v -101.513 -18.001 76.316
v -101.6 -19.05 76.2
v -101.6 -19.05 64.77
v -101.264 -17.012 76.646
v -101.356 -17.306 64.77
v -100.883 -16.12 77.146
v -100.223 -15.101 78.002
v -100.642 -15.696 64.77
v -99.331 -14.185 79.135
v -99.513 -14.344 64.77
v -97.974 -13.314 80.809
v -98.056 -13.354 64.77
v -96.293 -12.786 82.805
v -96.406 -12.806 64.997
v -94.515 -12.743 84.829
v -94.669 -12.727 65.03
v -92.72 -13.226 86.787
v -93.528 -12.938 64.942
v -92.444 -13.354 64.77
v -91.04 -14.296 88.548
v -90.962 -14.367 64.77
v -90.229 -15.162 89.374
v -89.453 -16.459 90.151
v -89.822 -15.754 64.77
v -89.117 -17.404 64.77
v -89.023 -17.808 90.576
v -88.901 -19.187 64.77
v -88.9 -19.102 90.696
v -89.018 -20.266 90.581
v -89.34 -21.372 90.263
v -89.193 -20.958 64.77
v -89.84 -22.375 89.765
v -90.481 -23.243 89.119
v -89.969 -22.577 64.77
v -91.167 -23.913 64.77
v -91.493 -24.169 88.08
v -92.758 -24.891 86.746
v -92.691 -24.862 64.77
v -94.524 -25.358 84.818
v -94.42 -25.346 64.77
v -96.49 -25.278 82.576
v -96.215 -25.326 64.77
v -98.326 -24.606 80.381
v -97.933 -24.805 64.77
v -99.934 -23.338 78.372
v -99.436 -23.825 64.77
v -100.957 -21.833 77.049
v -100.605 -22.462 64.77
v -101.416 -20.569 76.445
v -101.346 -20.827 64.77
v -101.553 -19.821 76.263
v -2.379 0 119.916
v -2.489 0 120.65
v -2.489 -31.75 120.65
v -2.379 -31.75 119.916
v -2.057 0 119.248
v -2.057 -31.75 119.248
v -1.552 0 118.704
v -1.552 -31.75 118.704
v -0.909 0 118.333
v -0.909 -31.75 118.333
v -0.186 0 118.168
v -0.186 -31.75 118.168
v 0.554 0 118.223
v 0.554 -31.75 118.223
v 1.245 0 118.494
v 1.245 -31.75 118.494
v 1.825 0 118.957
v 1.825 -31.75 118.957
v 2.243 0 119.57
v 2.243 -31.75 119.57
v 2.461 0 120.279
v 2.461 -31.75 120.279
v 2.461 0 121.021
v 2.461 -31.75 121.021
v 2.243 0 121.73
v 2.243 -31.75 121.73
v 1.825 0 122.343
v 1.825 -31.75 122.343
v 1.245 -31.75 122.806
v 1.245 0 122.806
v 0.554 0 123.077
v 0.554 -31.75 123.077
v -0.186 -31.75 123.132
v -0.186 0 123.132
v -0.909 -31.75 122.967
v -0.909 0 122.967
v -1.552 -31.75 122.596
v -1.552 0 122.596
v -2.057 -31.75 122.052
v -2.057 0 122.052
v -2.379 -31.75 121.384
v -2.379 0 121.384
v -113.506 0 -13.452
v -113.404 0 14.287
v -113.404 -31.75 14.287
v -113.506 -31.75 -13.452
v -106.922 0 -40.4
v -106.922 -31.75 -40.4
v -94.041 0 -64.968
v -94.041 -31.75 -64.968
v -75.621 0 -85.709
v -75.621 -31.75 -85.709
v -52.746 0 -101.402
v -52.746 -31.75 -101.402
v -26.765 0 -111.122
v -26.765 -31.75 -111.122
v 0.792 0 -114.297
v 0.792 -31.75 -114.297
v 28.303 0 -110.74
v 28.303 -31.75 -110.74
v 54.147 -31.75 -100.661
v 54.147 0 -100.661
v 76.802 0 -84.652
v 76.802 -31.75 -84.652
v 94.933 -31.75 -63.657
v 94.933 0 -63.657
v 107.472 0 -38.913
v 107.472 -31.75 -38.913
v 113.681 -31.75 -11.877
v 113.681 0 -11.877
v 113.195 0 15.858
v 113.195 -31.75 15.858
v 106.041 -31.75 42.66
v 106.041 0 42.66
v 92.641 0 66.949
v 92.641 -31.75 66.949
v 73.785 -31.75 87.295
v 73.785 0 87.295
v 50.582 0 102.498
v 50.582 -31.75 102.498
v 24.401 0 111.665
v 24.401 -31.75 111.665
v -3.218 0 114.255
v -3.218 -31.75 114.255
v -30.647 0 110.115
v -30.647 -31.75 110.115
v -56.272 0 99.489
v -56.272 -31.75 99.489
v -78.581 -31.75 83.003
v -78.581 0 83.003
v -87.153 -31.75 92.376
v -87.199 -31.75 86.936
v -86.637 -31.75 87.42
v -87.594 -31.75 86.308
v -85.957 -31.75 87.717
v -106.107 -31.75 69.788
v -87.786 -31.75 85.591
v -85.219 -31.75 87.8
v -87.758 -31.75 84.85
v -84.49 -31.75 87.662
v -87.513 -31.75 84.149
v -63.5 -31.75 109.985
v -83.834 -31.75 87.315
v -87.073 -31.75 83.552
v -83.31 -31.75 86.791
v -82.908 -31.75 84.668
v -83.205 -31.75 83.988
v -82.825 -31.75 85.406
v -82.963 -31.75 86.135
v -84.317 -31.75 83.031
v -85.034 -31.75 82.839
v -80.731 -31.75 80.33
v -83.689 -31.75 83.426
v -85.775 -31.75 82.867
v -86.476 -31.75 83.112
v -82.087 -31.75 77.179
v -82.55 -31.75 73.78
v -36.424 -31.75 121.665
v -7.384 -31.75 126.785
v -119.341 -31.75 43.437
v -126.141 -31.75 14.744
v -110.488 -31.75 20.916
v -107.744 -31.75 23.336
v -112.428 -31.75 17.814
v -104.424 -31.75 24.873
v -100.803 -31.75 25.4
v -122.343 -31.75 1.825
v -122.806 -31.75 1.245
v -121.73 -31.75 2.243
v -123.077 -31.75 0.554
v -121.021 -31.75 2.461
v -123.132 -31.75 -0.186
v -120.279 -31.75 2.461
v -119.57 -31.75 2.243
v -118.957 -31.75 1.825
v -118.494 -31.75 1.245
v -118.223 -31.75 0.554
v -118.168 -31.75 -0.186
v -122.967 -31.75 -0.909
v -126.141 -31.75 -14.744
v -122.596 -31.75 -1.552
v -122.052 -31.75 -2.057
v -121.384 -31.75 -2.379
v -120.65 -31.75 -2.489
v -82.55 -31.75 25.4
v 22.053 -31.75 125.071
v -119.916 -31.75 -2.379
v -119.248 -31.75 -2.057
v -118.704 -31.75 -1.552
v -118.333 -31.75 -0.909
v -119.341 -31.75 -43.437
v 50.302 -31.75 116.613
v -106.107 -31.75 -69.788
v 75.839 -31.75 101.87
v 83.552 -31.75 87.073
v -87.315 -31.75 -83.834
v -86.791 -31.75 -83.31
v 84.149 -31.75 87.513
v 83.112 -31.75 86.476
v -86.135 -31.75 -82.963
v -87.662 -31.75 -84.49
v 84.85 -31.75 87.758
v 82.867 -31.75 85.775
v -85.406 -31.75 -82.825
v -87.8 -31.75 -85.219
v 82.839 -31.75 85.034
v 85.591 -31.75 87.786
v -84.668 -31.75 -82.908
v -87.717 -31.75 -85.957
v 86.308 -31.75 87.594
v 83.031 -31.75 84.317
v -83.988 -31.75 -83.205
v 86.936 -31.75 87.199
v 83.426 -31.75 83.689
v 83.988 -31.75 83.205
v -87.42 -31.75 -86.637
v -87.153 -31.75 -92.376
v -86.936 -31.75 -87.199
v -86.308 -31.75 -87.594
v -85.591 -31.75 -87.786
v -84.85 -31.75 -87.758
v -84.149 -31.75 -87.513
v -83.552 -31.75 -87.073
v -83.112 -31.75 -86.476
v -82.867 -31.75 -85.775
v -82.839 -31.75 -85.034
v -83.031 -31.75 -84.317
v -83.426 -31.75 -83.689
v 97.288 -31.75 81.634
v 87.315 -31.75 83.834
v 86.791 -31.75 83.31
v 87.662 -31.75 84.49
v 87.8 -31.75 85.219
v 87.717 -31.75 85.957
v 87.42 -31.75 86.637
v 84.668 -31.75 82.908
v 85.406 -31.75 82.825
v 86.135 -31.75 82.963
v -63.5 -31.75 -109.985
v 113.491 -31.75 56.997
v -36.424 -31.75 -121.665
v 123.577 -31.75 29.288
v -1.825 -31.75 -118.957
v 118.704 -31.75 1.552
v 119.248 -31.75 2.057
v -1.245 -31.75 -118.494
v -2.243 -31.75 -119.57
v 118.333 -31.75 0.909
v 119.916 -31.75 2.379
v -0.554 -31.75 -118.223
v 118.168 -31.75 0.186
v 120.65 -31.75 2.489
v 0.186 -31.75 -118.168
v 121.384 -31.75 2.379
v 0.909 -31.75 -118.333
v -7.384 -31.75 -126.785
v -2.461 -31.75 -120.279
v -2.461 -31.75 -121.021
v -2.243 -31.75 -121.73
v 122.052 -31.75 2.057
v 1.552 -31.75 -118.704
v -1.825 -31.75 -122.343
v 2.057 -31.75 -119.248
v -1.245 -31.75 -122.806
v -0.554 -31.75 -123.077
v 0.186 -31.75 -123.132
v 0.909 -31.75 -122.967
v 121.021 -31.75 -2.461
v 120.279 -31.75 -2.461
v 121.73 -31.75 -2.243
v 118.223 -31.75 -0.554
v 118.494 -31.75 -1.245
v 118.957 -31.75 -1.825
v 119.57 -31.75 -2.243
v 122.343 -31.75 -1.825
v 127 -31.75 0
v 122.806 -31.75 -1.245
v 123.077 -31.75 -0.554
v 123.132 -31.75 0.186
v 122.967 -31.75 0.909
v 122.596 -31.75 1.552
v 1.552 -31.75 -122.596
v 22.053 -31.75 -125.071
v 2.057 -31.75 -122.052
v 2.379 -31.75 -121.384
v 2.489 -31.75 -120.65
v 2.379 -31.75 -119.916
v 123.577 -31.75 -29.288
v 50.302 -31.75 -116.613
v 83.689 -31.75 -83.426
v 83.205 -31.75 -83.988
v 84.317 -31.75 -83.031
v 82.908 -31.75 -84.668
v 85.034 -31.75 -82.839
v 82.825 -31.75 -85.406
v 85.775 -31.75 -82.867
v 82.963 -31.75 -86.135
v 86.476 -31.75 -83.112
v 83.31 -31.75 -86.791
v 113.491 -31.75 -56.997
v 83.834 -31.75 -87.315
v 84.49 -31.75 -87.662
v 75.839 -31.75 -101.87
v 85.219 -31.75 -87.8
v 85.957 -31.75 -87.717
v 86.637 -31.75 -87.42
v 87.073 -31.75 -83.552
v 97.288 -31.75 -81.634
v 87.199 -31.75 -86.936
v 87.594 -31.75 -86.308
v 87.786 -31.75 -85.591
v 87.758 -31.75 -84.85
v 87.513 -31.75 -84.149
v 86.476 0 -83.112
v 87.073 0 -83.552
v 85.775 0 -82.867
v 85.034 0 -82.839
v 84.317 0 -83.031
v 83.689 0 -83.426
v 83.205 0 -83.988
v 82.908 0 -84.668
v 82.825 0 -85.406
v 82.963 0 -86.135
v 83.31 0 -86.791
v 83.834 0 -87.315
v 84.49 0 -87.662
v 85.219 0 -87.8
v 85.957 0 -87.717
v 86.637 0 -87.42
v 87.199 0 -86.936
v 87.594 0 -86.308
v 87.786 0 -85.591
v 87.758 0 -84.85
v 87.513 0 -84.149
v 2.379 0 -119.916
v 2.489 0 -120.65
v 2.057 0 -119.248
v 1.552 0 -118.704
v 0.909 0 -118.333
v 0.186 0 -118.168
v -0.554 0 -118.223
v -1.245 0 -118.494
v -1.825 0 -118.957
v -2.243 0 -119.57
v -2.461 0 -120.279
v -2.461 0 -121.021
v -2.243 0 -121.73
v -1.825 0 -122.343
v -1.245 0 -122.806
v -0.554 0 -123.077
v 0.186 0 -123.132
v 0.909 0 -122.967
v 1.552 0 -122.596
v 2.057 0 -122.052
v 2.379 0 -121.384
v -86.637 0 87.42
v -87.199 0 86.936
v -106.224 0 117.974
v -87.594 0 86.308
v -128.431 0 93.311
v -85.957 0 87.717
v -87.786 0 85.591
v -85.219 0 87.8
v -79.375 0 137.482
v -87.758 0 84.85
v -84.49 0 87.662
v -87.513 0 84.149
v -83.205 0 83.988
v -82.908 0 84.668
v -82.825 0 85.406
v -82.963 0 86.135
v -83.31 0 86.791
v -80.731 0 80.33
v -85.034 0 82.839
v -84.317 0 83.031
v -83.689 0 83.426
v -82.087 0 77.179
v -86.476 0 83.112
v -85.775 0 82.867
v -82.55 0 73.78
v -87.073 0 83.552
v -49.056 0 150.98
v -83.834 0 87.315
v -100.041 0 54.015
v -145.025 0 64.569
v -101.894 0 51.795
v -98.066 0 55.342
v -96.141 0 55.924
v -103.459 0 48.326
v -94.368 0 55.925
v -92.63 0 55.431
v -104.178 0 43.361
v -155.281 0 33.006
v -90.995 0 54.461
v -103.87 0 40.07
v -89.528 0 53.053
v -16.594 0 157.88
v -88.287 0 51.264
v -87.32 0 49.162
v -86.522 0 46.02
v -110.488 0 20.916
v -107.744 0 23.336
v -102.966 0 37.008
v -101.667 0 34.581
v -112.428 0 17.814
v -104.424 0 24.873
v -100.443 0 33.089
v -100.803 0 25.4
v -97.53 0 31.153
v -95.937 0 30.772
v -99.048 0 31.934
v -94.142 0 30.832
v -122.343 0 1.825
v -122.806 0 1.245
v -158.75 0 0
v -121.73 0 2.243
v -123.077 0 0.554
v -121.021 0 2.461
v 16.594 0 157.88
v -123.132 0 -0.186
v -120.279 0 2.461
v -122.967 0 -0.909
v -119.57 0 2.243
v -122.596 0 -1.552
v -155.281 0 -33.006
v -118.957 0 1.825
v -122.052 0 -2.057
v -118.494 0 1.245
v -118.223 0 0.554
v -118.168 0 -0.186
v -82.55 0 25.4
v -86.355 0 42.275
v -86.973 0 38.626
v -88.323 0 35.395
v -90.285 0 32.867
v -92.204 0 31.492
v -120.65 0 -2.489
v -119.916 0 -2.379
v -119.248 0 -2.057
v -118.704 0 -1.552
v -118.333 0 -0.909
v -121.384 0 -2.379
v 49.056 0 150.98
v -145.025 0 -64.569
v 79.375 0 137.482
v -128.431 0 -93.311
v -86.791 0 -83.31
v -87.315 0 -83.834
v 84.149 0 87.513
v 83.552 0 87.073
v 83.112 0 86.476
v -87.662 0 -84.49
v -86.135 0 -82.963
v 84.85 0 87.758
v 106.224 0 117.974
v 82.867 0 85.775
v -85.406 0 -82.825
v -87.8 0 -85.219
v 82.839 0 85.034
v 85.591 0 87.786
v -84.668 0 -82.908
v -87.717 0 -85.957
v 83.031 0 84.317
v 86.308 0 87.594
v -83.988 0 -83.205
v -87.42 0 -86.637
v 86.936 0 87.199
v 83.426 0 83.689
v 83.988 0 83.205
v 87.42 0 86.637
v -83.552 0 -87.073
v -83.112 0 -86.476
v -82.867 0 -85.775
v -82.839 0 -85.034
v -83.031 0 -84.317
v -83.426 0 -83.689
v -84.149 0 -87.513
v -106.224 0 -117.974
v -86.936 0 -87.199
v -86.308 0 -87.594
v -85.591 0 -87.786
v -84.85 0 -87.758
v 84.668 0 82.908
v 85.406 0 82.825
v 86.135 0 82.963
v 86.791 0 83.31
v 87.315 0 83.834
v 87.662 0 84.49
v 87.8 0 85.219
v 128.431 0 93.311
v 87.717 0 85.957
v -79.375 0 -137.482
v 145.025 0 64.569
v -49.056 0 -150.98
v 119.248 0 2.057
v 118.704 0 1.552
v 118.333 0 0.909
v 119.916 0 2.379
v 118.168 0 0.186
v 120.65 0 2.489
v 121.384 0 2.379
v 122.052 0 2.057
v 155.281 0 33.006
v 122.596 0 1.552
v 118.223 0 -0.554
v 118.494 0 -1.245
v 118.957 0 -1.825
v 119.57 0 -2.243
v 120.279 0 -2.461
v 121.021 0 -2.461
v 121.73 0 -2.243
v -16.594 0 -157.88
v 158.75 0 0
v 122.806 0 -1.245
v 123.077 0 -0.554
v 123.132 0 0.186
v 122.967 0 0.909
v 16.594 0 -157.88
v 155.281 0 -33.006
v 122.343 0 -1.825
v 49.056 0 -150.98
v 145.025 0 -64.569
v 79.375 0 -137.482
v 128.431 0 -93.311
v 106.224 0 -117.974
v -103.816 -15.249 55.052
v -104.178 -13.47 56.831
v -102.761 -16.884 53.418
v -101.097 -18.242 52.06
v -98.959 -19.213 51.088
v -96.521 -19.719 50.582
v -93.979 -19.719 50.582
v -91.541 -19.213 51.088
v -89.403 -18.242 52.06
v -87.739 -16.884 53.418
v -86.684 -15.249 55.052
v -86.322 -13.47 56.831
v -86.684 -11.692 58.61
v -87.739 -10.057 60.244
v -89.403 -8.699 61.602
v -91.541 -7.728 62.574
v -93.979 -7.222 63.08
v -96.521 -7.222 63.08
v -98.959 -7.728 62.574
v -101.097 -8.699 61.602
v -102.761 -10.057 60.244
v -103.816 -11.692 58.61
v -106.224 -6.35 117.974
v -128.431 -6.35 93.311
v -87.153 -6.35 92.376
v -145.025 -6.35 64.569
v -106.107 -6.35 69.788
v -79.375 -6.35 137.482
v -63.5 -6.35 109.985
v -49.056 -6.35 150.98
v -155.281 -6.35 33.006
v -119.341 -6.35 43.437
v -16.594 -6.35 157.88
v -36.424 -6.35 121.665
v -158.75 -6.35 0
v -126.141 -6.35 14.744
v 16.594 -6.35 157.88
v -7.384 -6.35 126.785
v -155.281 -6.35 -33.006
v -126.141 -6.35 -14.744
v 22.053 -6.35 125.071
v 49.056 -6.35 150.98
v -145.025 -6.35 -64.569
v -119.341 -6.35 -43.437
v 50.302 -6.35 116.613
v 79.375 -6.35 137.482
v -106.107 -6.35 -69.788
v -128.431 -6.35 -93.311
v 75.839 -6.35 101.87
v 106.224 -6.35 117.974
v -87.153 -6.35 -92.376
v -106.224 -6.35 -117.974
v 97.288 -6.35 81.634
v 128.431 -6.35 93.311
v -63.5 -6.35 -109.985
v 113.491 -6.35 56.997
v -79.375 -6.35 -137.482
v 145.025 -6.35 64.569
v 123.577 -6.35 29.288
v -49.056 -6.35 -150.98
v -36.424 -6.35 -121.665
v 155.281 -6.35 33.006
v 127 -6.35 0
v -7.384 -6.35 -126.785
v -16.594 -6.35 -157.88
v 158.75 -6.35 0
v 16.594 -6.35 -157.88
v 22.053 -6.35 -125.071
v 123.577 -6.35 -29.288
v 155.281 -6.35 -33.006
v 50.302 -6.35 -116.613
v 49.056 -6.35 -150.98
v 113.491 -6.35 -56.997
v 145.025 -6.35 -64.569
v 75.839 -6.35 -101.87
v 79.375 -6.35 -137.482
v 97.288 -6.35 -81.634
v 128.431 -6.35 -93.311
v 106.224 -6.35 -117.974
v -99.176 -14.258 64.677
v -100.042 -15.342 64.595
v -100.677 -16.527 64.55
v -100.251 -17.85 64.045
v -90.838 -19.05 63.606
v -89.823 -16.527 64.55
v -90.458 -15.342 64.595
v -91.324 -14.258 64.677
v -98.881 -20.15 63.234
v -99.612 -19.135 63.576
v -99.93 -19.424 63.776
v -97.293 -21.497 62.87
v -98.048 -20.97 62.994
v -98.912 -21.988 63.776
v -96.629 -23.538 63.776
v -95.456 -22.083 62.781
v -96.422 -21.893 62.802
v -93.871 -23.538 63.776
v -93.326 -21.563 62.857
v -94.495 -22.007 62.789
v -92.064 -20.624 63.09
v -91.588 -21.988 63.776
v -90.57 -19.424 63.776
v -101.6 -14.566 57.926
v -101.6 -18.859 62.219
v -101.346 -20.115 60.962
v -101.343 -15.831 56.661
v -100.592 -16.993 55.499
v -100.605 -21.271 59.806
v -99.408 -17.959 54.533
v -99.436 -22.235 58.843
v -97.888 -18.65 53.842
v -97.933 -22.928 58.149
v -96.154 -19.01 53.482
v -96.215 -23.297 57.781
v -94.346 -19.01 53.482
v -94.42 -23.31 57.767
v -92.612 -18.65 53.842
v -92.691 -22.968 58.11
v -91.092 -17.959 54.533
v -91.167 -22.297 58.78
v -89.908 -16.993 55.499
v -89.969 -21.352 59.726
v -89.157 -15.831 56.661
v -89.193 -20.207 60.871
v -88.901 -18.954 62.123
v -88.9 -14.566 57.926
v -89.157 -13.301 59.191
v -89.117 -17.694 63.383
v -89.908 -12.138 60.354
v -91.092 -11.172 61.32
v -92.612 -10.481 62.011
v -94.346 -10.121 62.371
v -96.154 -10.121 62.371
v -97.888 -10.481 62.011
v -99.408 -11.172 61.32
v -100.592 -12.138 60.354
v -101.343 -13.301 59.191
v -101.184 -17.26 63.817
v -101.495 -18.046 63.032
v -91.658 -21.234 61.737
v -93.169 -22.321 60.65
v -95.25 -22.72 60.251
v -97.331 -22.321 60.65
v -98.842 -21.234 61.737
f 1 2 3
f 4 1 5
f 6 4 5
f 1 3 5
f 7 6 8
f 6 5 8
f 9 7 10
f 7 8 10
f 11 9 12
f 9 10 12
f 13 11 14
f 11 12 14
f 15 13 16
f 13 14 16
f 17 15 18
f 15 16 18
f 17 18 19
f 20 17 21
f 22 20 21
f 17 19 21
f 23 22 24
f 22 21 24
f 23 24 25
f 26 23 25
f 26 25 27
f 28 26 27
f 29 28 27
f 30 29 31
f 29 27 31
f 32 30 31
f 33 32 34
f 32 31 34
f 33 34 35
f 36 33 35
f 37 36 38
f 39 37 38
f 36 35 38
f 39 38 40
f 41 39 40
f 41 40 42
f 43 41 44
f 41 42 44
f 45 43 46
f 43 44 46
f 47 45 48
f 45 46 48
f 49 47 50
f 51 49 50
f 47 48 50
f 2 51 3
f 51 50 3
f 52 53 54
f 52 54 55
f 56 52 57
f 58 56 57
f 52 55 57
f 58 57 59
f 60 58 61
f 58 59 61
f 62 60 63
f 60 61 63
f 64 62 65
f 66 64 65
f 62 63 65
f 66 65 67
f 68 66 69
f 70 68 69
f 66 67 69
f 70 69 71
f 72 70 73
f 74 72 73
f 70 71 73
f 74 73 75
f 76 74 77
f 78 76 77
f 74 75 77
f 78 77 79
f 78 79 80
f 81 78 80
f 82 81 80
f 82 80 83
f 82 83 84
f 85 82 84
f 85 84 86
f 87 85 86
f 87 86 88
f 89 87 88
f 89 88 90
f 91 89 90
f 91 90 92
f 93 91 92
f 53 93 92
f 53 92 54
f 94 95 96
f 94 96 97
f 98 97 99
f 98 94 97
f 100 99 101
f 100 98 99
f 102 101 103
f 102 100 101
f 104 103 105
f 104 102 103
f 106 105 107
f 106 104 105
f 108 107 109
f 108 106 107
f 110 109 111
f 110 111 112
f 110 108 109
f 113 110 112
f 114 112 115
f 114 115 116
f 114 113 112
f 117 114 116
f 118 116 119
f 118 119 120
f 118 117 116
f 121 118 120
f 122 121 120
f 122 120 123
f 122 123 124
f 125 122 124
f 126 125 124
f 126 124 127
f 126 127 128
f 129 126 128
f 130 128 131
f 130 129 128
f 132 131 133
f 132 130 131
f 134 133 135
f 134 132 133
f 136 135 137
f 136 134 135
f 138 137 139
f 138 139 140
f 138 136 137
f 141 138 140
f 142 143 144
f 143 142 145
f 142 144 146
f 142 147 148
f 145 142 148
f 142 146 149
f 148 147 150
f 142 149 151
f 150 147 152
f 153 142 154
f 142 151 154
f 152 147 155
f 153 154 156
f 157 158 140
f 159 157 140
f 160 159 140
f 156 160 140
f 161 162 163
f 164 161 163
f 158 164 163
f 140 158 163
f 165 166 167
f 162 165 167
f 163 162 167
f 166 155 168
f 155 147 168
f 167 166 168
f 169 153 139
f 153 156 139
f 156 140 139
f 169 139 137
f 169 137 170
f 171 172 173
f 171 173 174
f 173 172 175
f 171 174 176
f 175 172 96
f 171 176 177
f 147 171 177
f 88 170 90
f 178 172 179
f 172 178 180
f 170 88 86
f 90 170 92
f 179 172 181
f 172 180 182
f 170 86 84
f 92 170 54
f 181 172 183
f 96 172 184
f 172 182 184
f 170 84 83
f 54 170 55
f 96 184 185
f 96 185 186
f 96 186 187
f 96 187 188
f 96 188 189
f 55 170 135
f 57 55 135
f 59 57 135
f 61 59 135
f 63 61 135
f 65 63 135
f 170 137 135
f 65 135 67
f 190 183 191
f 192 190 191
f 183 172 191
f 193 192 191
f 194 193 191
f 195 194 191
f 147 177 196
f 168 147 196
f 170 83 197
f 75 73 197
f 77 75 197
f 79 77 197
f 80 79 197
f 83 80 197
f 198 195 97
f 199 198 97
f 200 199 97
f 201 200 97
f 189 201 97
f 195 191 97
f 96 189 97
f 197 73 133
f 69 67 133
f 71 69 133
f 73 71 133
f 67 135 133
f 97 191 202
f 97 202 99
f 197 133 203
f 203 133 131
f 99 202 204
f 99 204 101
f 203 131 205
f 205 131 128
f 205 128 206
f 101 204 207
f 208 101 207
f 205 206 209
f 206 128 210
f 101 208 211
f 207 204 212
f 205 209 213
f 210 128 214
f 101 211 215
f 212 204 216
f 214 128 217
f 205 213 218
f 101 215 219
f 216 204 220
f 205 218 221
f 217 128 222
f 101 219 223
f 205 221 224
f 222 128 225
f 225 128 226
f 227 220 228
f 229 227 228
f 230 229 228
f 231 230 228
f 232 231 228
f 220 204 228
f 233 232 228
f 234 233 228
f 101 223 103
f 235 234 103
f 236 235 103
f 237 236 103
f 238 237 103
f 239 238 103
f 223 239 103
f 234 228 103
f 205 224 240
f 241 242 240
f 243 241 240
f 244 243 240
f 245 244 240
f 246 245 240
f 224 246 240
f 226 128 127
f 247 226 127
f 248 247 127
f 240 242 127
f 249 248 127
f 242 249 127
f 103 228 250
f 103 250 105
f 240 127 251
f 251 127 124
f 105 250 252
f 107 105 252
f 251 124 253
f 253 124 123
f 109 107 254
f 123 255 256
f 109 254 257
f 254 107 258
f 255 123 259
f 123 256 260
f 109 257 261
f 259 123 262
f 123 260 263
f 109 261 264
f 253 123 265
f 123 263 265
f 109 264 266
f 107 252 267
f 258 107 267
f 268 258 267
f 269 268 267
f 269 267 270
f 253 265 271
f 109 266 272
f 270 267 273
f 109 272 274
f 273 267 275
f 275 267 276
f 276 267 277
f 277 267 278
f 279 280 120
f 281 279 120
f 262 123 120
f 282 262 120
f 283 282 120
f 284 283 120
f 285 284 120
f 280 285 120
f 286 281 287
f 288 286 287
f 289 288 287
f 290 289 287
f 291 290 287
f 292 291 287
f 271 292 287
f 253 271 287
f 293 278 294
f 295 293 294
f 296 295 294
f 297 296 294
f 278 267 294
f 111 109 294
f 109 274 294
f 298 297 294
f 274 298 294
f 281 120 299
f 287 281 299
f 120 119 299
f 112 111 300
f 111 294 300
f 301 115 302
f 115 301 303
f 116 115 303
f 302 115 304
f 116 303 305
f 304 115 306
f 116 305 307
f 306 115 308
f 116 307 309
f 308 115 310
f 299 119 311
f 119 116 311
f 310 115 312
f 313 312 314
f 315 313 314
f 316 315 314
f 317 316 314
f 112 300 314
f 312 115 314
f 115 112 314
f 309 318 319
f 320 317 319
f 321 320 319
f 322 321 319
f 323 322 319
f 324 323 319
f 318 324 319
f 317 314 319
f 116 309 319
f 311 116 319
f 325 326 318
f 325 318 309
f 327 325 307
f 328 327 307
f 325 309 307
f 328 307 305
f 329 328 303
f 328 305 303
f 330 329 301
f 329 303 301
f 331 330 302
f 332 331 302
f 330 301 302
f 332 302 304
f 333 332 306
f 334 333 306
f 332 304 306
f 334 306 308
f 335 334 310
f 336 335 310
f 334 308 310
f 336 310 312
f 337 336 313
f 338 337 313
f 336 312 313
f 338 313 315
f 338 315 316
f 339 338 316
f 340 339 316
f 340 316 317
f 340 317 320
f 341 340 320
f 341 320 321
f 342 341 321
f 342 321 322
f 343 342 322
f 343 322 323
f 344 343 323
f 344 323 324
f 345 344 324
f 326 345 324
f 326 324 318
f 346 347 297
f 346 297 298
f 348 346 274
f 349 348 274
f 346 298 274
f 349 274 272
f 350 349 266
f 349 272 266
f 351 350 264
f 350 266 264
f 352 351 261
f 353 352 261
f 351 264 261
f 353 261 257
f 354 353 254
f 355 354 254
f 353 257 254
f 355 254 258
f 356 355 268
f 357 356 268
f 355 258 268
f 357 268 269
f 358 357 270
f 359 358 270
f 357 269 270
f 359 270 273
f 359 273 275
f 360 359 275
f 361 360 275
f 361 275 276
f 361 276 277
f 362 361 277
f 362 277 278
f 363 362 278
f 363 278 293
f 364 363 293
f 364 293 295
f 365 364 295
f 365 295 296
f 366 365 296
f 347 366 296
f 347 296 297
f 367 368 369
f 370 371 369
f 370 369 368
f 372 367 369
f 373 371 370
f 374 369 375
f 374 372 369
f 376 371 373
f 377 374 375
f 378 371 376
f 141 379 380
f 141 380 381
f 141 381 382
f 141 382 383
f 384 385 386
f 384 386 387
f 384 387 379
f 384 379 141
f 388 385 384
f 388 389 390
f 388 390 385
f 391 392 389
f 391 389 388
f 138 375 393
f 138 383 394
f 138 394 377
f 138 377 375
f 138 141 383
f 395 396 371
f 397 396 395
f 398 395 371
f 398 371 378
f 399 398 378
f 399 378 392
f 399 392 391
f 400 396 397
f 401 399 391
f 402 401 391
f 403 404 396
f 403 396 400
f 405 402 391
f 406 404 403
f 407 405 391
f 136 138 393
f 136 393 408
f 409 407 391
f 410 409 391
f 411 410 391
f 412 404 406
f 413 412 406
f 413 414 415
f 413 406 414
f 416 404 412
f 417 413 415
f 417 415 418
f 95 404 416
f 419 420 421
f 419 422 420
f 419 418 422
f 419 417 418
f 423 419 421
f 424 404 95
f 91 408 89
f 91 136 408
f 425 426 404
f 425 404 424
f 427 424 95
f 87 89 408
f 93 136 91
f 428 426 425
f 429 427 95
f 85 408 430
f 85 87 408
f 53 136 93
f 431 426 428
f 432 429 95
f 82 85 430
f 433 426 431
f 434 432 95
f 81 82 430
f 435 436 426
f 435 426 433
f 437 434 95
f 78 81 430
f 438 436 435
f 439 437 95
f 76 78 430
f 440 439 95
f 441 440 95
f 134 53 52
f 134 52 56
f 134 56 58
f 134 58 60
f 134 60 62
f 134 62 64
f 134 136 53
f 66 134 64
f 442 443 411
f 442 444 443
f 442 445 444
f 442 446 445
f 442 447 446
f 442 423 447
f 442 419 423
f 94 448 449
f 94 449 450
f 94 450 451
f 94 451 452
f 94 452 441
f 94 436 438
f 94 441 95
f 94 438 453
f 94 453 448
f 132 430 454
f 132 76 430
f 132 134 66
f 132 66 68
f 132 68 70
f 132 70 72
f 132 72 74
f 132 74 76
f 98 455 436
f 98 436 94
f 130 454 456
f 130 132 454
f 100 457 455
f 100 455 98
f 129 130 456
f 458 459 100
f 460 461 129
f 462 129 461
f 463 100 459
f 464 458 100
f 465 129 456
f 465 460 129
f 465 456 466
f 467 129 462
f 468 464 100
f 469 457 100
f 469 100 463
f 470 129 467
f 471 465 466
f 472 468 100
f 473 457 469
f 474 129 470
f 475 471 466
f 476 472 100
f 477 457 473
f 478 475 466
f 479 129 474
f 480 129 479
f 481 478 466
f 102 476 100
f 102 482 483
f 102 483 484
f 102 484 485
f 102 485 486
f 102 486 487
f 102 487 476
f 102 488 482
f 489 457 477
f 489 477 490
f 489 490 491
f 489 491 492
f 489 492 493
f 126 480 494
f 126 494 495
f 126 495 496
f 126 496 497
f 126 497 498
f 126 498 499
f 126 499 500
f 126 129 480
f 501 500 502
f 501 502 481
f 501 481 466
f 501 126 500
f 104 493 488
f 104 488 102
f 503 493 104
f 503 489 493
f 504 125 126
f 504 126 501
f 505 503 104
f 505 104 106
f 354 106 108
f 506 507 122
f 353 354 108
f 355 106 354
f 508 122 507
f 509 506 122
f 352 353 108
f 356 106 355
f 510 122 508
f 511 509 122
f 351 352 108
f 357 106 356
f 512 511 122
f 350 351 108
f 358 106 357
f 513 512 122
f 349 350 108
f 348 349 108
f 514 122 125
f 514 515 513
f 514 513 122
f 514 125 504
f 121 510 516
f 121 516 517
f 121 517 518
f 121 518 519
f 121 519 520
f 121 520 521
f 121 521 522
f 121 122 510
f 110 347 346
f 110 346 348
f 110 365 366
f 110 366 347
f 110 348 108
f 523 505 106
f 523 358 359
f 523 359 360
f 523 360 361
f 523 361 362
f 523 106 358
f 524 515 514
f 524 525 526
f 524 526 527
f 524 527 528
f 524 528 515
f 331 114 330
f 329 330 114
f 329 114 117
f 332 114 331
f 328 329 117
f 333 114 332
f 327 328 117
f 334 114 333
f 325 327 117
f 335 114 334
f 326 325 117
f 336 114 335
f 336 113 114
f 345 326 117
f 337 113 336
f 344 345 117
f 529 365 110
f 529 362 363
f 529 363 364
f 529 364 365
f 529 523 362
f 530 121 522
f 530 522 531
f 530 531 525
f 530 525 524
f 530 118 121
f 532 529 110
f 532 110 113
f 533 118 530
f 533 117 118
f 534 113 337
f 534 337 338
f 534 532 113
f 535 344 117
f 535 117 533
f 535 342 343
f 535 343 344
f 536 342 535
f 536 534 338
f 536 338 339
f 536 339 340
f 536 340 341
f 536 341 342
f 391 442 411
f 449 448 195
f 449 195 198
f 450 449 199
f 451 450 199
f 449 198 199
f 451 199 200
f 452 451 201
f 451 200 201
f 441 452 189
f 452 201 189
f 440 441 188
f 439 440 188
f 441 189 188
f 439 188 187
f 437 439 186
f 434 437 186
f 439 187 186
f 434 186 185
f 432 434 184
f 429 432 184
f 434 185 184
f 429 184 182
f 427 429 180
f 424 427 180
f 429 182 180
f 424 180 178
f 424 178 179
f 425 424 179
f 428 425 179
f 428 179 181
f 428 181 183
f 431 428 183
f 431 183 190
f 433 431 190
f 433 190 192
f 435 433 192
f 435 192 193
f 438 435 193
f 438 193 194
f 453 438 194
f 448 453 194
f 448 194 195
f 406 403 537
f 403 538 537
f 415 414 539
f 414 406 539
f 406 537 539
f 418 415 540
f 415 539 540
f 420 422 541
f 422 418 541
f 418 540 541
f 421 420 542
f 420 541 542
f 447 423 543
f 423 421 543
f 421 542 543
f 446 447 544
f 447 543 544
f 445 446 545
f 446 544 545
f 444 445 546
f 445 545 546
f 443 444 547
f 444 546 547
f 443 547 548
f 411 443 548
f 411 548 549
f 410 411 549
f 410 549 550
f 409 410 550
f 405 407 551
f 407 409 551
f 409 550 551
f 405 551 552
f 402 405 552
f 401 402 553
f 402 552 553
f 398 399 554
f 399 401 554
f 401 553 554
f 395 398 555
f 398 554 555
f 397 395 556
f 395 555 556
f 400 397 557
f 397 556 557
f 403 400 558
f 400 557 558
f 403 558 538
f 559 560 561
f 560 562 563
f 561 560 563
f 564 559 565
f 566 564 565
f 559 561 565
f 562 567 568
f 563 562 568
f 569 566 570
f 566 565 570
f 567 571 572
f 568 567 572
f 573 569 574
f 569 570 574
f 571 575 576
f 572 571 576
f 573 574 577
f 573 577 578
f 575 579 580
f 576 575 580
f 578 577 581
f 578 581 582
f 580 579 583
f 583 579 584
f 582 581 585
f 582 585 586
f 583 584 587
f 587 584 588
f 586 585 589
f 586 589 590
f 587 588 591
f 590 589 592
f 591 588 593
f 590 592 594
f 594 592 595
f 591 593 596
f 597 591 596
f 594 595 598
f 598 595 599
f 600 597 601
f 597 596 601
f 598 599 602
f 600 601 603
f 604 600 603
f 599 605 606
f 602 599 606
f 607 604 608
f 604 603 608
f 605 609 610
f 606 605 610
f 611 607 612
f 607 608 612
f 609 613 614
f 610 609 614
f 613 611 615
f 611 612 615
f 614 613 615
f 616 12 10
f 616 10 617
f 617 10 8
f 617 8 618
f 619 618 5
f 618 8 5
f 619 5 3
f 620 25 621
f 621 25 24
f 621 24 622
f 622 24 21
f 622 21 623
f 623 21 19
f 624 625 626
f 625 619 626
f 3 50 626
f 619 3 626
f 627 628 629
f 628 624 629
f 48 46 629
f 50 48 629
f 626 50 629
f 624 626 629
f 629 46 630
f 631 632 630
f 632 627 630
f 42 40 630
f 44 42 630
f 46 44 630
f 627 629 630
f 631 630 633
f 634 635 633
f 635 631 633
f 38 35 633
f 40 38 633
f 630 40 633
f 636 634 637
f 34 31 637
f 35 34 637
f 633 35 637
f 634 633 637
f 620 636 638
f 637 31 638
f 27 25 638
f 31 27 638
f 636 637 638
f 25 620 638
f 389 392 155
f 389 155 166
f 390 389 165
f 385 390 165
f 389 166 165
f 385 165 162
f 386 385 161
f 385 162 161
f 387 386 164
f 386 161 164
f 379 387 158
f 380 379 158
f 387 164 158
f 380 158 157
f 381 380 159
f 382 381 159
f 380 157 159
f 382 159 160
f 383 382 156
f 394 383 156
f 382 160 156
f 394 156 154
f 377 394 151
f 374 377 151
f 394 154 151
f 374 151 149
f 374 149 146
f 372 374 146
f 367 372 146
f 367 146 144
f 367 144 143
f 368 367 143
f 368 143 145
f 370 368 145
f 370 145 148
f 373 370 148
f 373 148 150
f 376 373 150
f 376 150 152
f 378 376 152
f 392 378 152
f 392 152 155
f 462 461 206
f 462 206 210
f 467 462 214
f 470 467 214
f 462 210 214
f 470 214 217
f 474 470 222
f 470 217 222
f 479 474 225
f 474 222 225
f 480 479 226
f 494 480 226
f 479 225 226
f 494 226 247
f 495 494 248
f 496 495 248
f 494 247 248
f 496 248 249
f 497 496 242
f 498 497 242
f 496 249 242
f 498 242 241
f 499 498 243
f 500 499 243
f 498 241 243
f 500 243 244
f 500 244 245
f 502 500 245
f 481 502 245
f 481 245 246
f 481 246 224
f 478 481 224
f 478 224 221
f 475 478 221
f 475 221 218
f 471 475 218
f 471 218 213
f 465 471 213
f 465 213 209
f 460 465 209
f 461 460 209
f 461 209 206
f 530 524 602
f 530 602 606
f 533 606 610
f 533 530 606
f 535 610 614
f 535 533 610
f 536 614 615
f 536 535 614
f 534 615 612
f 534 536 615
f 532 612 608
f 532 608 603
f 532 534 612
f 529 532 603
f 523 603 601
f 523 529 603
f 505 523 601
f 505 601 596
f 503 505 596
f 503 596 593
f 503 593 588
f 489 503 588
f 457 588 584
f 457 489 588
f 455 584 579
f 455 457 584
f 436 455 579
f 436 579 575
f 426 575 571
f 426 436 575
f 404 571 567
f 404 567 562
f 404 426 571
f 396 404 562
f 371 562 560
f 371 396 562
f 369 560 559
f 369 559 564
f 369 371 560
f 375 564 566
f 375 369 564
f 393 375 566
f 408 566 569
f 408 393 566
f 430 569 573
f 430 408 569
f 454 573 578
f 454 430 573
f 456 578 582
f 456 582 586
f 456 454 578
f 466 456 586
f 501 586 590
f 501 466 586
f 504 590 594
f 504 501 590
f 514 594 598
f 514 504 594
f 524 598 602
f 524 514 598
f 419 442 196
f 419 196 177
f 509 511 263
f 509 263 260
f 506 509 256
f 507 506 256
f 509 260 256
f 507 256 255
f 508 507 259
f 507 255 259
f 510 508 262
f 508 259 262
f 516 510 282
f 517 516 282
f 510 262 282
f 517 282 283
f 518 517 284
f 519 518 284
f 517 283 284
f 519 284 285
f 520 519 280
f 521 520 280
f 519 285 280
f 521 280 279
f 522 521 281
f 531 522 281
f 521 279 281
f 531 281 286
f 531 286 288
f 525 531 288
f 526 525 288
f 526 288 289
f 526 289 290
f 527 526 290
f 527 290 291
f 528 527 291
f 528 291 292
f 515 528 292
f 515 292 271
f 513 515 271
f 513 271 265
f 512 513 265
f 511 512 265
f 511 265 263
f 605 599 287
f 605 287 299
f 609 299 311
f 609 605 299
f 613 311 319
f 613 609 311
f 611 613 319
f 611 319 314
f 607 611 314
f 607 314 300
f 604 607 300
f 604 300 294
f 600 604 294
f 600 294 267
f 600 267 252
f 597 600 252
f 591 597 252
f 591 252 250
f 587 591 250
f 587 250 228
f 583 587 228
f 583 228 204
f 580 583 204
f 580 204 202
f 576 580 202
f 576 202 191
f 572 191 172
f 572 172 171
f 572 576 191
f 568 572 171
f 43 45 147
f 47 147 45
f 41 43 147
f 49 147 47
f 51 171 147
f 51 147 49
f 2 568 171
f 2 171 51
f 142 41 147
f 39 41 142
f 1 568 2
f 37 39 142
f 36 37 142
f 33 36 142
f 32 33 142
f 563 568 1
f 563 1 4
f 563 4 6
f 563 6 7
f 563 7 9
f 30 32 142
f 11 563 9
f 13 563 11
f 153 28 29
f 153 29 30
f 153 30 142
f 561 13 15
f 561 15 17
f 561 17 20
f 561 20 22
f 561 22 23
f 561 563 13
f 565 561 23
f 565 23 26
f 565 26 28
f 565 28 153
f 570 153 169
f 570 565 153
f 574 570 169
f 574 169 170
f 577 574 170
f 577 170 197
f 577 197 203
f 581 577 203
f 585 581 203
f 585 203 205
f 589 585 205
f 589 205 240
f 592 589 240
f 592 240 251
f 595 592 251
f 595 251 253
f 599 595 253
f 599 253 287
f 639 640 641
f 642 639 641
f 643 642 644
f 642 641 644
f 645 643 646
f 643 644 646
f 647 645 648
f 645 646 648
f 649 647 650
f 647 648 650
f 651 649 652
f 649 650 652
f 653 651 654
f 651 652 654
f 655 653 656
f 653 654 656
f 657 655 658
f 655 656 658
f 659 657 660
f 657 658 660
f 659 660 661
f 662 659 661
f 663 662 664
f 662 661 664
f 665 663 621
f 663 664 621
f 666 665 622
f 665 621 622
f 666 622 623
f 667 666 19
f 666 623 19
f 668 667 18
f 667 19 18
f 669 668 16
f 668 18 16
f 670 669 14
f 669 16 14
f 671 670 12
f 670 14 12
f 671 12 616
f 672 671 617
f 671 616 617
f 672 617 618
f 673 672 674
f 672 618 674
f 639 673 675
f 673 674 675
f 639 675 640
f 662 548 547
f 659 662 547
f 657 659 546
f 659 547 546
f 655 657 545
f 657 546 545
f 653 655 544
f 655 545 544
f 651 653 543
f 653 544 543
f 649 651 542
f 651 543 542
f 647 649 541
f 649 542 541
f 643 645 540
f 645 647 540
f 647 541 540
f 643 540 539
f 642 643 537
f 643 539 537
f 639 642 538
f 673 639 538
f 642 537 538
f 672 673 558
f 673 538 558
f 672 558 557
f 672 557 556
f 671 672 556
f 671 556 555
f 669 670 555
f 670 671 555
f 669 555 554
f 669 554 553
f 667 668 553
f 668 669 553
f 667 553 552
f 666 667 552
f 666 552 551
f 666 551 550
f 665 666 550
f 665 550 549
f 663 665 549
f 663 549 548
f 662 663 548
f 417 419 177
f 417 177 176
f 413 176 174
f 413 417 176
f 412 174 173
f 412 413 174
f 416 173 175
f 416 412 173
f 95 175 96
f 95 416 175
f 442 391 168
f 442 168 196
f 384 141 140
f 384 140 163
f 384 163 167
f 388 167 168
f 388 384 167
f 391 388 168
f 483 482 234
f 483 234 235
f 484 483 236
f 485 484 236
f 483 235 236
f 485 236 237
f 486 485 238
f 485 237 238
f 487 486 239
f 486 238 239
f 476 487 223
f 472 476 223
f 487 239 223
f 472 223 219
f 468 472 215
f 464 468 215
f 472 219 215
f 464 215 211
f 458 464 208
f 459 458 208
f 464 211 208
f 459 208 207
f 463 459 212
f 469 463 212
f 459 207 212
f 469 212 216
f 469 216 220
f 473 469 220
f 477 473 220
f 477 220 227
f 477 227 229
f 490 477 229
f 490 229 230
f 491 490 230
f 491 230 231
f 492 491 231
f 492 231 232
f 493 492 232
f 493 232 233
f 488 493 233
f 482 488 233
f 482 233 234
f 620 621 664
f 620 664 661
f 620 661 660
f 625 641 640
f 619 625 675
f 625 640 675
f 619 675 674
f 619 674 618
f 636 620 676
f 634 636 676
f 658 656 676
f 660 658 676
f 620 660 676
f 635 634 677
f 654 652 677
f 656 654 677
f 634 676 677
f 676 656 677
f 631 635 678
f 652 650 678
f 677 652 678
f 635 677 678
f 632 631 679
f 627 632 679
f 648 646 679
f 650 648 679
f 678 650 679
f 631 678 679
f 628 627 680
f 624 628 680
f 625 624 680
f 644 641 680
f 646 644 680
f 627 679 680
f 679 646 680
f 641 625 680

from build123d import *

# Parameters (mm, degrees)
SKETCH7_R                         = 158.75
SKETCH7_R_2                       = 127
BOSS_EXTRUDE2_DEPTH               = 6.35
SKETCH7_3_R                       = 127
BOSS_EXTRUDE3_DEPTH               = 31.75
PIPE_TAP_DRILL_FOR_1_2_TAP2_D     = 17.8562
PIPE_TAP_DRILL_FOR_1_2_TAP2_DEPTH = 31.75
PIPE_TAP_DRILL_FOR_1_2_TAP2_TIP   = 5.364543693
F_1_2_0_5_DIAMETER_HOLE3_D        = 12.7
F_1_2_0_5_DIAMETER_HOLE3_DEPTH    = 62.23
F_1_2_0_5_DIAMETER_HOLE3_TIP      = 3.815464931
F_1_2_0_5_DIAMETER_HOLE4_D        = 12.7
F_1_2_0_5_DIAMETER_HOLE4_DEPTH    = 39.37
F_1_2_0_5_DIAMETER_HOLE4_TIP      = 3.815464931
F_10_CLEARANCE_HOLE1_D            = 4.9784
CIRPATTERN1_COUNT                 = 8


with BuildPart() as part:
    # Sketch7 → Boss-Extrude2 (new body)
    with BuildSketch(Plane(origin=(0, 0, 0), x_dir=(1, 0, 0), z_dir=(0, 1, 0))):
        Circle(SKETCH7_R)
        Circle(SKETCH7_R_2, mode=Mode.SUBTRACT)
    extrude(amount=-BOSS_EXTRUDE2_DEPTH)

    # Sketch7<3> → Boss-Extrude3 (add)
    with BuildSketch(Plane(origin=(0, 0, 0), x_dir=(1, 0, 0), z_dir=(0, 1, 0))):
        Circle(SKETCH7_3_R)
        with BuildLine():
            ThreePointArc((-100.803124952, -25.4), (-109.203385364, -22.225), (-113.403515571, -14.2875))
            ThreePointArc((-113.403515571, -14.2875), (101.95581504, 51.66722152), (-78.58125, -83.002874338))
            ThreePointArc((-78.58125, -83.002874338), (-81.5156949, -78.800448531), (-82.55, -73.780332745))
            Line((-82.55, -73.780332745), (-82.55, -25.4))
            Line((-82.55, -25.4), (-100.803124952, -25.4))
        make_face(mode=Mode.SUBTRACT)
    extrude(amount=-BOSS_EXTRUDE3_DEPTH)

    # Pipe Tap Drill for 1/2 Tap2
    with Locations(Plane(origin=(0, -12.7, 12.7), x_dir=(1, 0, 0), z_dir=(0, 0.7071067811865488, -0.7071067811865464))):
        with Locations((-95.25, -30.660512242)):
            Hole(PIPE_TAP_DRILL_FOR_1_2_TAP2_D / 2, depth=PIPE_TAP_DRILL_FOR_1_2_TAP2_DEPTH)
            with Locations((0, 0, -(PIPE_TAP_DRILL_FOR_1_2_TAP2_DEPTH + PIPE_TAP_DRILL_FOR_1_2_TAP2_TIP / 2))):  # 118° drill point
                Cone(0, PIPE_TAP_DRILL_FOR_1_2_TAP2_D / 2, PIPE_TAP_DRILL_FOR_1_2_TAP2_TIP, mode=Mode.SUBTRACT)

    # 1/2 (0.5) Diameter Hole3
    with Locations(Plane.XY.offset(127)):
        with Locations((-95.25, -19.05)):
            Hole(F_1_2_0_5_DIAMETER_HOLE3_D / 2, depth=F_1_2_0_5_DIAMETER_HOLE3_DEPTH)
            with Locations((0, 0, -(F_1_2_0_5_DIAMETER_HOLE3_DEPTH + F_1_2_0_5_DIAMETER_HOLE3_TIP / 2))):  # 118° drill point
                Cone(0, F_1_2_0_5_DIAMETER_HOLE3_D / 2, F_1_2_0_5_DIAMETER_HOLE3_TIP, mode=Mode.SUBTRACT)

    # 1/2 (0.5) Diameter Hole4
    with Locations(Plane(origin=(0, -12.7, 12.7), x_dir=(1, 0, 0), z_dir=(0, 0.7071067811865488, -0.7071067811865464))):
        with Locations((-95.25, -30.660512242)):
            Hole(F_1_2_0_5_DIAMETER_HOLE4_D / 2, depth=F_1_2_0_5_DIAMETER_HOLE4_DEPTH)
            with Locations((0, 0, -(F_1_2_0_5_DIAMETER_HOLE4_DEPTH + F_1_2_0_5_DIAMETER_HOLE4_TIP / 2))):  # 118° drill point
                Cone(0, F_1_2_0_5_DIAMETER_HOLE4_D / 2, F_1_2_0_5_DIAMETER_HOLE4_TIP, mode=Mode.SUBTRACT)

    # #10 Clearance Hole1 (through all)
    with Locations(Plane(origin=(0, 0, 0), x_dir=(1, 0, 0), z_dir=(0, 1, 0))):
        with Locations((0, -120.65)):
            f_10_clearance_hole1 = Hole(F_10_CLEARANCE_HOLE1_D / 2)

    # CirPattern1: #10 Clearance Hole1 ×8 about axis
    cirpattern1_axis = Axis((0, -31.75, 0), (0, 1, 0))
    for i in range(1, CIRPATTERN1_COUNT):
        add(f_10_clearance_hole1.rotate(cirpattern1_axis, i * 360 / CIRPATTERN1_COUNT), mode=Mode.SUBTRACT)


solid = part.part
